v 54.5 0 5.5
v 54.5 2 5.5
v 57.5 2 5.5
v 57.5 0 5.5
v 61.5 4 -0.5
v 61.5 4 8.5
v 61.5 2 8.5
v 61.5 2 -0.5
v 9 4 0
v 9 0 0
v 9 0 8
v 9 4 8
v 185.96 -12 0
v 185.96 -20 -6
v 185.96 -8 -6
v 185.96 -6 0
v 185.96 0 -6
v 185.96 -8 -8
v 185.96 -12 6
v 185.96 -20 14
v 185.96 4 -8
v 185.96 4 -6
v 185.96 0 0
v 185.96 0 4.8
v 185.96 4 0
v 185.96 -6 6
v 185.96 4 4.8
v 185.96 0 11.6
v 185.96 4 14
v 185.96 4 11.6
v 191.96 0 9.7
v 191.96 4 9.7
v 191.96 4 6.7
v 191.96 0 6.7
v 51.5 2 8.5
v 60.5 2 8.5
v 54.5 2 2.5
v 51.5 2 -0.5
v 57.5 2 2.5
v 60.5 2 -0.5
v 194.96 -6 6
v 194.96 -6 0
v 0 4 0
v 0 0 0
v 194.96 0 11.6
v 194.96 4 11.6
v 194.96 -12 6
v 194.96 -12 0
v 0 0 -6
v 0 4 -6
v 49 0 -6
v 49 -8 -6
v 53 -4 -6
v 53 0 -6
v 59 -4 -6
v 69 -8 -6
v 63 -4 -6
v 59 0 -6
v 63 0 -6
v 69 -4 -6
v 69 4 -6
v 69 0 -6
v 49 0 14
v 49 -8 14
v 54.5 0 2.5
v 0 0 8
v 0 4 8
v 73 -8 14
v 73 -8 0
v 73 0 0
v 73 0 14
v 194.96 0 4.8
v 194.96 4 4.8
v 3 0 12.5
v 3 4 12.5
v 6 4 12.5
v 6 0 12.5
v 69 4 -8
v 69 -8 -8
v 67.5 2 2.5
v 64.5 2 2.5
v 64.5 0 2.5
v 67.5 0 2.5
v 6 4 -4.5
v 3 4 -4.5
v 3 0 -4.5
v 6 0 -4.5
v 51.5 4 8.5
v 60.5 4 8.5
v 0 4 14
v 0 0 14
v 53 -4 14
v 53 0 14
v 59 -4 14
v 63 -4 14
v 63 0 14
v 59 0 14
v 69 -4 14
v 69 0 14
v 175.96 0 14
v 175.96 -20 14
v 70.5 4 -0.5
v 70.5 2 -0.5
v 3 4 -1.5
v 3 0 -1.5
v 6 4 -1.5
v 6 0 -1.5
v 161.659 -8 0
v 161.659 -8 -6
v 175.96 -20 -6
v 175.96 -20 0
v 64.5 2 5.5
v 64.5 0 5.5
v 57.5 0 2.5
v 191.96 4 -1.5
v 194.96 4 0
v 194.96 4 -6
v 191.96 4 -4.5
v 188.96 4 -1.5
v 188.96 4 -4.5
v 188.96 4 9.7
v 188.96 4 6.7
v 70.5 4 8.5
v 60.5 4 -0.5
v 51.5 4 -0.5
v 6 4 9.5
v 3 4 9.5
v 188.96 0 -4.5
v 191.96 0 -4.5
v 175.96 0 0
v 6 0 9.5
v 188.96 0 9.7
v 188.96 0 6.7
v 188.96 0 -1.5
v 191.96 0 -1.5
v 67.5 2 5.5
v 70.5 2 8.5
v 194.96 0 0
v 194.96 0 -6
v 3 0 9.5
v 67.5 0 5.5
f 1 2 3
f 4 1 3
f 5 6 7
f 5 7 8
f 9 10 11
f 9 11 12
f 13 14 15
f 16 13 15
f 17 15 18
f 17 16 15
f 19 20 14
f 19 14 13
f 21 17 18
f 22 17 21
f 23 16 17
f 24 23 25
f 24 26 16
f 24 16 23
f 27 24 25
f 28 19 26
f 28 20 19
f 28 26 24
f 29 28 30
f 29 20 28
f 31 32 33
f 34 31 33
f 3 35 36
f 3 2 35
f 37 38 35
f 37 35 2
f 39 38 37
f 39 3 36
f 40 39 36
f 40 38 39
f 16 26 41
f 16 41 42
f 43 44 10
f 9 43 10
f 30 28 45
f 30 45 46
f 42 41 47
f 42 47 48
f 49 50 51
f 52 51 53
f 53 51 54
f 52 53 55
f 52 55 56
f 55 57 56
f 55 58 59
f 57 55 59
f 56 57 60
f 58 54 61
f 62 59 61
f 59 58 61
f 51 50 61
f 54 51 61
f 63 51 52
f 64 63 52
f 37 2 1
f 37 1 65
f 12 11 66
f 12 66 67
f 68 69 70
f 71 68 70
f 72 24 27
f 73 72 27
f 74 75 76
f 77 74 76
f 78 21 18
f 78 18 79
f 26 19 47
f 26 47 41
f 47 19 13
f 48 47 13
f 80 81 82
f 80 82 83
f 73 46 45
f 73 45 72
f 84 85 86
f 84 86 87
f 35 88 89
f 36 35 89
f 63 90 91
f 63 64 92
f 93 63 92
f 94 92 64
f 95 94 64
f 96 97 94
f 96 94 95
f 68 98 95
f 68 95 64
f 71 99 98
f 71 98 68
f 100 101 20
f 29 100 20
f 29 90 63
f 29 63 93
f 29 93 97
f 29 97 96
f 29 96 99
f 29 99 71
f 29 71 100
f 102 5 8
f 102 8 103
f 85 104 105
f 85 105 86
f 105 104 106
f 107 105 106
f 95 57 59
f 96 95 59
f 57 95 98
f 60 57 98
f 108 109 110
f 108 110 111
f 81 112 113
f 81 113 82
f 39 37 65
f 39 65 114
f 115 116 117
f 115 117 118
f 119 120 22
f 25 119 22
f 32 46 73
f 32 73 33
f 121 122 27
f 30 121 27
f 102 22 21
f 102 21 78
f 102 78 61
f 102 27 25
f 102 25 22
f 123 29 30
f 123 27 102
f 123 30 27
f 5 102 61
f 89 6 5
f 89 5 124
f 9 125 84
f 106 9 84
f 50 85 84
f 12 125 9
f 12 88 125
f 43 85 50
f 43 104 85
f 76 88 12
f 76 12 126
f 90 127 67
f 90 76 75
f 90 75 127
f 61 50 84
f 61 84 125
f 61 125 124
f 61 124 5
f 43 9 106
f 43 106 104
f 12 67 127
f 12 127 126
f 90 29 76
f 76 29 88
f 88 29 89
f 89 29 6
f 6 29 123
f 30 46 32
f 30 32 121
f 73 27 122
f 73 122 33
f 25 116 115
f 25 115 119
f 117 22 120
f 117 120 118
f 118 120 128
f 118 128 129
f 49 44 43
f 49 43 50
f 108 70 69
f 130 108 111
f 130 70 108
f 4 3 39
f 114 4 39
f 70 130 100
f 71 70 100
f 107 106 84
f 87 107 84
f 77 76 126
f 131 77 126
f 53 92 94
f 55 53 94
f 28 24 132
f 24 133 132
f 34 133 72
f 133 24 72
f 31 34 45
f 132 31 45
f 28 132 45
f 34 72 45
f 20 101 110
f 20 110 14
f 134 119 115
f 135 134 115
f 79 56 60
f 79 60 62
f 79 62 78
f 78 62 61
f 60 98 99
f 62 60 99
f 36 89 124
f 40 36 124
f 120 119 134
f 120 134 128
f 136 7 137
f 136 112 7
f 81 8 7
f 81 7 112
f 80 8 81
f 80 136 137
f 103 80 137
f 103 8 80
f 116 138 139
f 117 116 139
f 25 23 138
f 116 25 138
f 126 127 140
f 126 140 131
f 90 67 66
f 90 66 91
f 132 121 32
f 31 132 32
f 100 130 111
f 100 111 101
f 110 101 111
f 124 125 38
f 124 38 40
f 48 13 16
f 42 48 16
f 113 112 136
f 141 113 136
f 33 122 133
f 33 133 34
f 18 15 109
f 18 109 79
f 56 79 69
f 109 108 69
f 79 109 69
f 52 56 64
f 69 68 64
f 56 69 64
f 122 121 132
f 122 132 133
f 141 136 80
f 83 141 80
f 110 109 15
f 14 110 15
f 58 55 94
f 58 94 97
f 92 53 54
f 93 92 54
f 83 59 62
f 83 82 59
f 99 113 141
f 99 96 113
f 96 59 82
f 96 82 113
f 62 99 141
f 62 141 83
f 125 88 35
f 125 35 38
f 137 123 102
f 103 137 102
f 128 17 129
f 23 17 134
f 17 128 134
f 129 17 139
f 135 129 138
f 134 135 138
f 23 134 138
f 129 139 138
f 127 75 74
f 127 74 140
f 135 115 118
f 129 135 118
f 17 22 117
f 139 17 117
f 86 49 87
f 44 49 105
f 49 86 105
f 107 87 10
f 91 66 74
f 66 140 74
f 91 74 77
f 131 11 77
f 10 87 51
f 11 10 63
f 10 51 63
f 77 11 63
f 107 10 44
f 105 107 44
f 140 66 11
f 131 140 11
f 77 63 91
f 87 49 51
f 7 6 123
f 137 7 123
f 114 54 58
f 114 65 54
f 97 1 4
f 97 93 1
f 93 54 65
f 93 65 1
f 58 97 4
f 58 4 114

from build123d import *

# Parameters (mm, degrees)
SKETCH2_W           = 194.96
SKETCH2_H           = 6
BOSS_EXTRUDE1_DEPTH = 4
SKETCH3_W           = 176.96
SKETCH3_H           = 4
BOSS_EXTRUDE2_DEPTH = 14
SKETCH4_W           = 6
SKETCH4_H           = 4
BOSS_EXTRUDE3_DEPTH = 9
SKETCH5_W           = 6.8
SKETCH5_H           = 4
BOSS_EXTRUDE4_DEPTH = 9
CUT_EXTRUDE1_REACH  = 197.503
SKETCH6_W           = 3
SKETCH6_H           = 3
SKETCH7_W           = 10
SKETCH7_H           = 20
BOSS_EXTRUDE5_DEPTH = 20
SKETCH8_W           = 136.96
SKETCH8_H           = 6
BOSS_EXTRUDE6_DEPTH = 8
CHAMFER1_SIZE2      = 14.301043111
CHAMFER1_SIZE       = 12
BOSS_EXTRUDE7_DEPTH = 14
CUT_EXTRUDE2_REACH  = 199.001
SKETCH10_W          = 6
SKETCH10_H          = 4
CUT_EXTRUDE3_REACH  = 198.93
SKETCH11_W          = 3
SKETCH11_H          = 3
SKETCH12_W          = 116.96
SKETCH12_H          = 12
BOSS_EXTRUDE8_DEPTH = 2
SKETCH13_W          = 6
SKETCH13_H          = 6
BOSS_EXTRUDE9_DEPTH = 9
SKETCH14_W          = 9
SKETCH14_H          = 9
CUT_EXTRUDE4_DEPTH  = 2


with BuildPart() as part:
    # Sketch2 → Boss-Extrude1 (new body)
    with BuildSketch(Plane(origin=(0, 0, 0), x_dir=(1, 0, 0), z_dir=(0, 1, 0))):
        with Locations((97.48, 3)):
            Rectangle(SKETCH2_W, SKETCH2_H)
    extrude(amount=BOSS_EXTRUDE1_DEPTH)

    # Sketch3 → Boss-Extrude2 (add)
    with BuildSketch(Plane(origin=(0, 0, 0), x_dir=(-1, 0, 0), z_dir=(0, 0, -1))):
        with Locations((-97.48, 2)):
            Rectangle(SKETCH3_W, SKETCH3_H)
    extrude(amount=-BOSS_EXTRUDE2_DEPTH)

    # Sketch4 → Boss-Extrude3 (add)
    with BuildSketch(Plane.ZY.offset(-9)):
        with Locations((11, 2)):
            Rectangle(SKETCH4_W, SKETCH4_H)
    extrude(amount=BOSS_EXTRUDE3_DEPTH)

    # Sketch5 → Boss-Extrude4 (add)
    with BuildSketch(Plane(origin=(185.96, 0, 0), x_dir=(0, 0, -1), z_dir=(1, 0, 0))):
        with Locations((-8.2, 2)):
            Rectangle(SKETCH5_W, SKETCH5_H)
    extrude(amount=BOSS_EXTRUDE4_DEPTH)

    # Sketch6 → Cut-Extrude1 (cut, up to next)
    with BuildSketch(Plane(origin=(0, 4, 0), x_dir=(1, 0, 0), z_dir=(0, 1, 0)), mode=Mode.PRIVATE) as cut_extrude1_sk1:
        with Locations((4.5, 3)):
            Rectangle(SKETCH6_W, SKETCH6_H)
    cut_extrude1_tool1 = extrude(cut_extrude1_sk1.sketch, amount=-CUT_EXTRUDE1_REACH, mode=Mode.PRIVATE) & part.part
    # Sketch6 → Cut-Extrude1 (cut, up to next)
    with BuildSketch(Plane(origin=(0, 4, 0), x_dir=(1, 0, 0), z_dir=(0, 1, 0)), mode=Mode.PRIVATE) as cut_extrude1_sk2:
        with Locations((4.5, -11)):
            Rectangle(SKETCH6_W, SKETCH6_H)
    cut_extrude1_tool2 = extrude(cut_extrude1_sk2.sketch, amount=-CUT_EXTRUDE1_REACH, mode=Mode.PRIVATE) & part.part
    # Sketch6 → Cut-Extrude1 (cut, up to next)
    with BuildSketch(Plane(origin=(0, 4, 0), x_dir=(1, 0, 0), z_dir=(0, 1, 0)), mode=Mode.PRIVATE) as cut_extrude1_sk3:
        with Locations((190.46, 3)):
            Rectangle(SKETCH6_W, SKETCH6_H)
    cut_extrude1_tool3 = extrude(cut_extrude1_sk3.sketch, amount=-CUT_EXTRUDE1_REACH, mode=Mode.PRIVATE) & part.part
    # Sketch6 → Cut-Extrude1 (cut, up to next)
    with BuildSketch(Plane(origin=(0, 4, 0), x_dir=(1, 0, 0), z_dir=(0, 1, 0)), mode=Mode.PRIVATE) as cut_extrude1_sk4:
        with Locations((190.46, -8.2)):
            Rectangle(SKETCH6_W, SKETCH6_H)
    cut_extrude1_tool4 = extrude(cut_extrude1_sk4.sketch, amount=-CUT_EXTRUDE1_REACH, mode=Mode.PRIVATE) & part.part
    add(cut_extrude1_tool1.solids().sort_by_distance((4.5, 4, -3))[0], mode=Mode.SUBTRACT)
    add(cut_extrude1_tool2.solids().sort_by_distance((4.5, 4, 11))[0], mode=Mode.SUBTRACT)
    add(cut_extrude1_tool3.solids().sort_by_distance((190.46, 4, -3))[0], mode=Mode.SUBTRACT)
    add(cut_extrude1_tool4.solids().sort_by_distance((190.46, 4, 8.2))[0], mode=Mode.SUBTRACT)

    # Sketch7 → Boss-Extrude5 (add)
    with BuildSketch(Plane.XZ):
        with Locations((180.96, 4)):
            Rectangle(SKETCH7_W, SKETCH7_H)
    extrude(amount=BOSS_EXTRUDE5_DEPTH)

    # Sketch8 → Boss-Extrude6 (add)
    with BuildSketch(Plane.XZ):
        with Locations((117.48, -3)):
            Rectangle(SKETCH8_W, SKETCH8_H)
    extrude(amount=BOSS_EXTRUDE6_DEPTH)

    # Chamfer1
    chamfer1_edges = [part.edges().sort_by_distance(p)[0] for p in [
        (175.96, -8, -3),
    ]]
    chamfer1_side = [part.faces().sort_by_distance(p)[0] for p in [
        (175.96, -8.24, -3),
    ]]
    chamfer(chamfer1_edges, length=CHAMFER1_SIZE - 0.0001, length2=CHAMFER1_SIZE2 - 0.0001, reference=chamfer1_side[0])  # a hair under: the kernel refuses the full size

    # Sketch9 → Boss-Extrude7 (add)
    with BuildSketch(Plane.XY):
        Polygon((49, -8), (55, -8), (61, -8), (73, -8), (73, 0), (61, 0), (55, 0), (49, 0), align=None)
    extrude(amount=BOSS_EXTRUDE7_DEPTH)

    # Sketch10 → Cut-Extrude2 (cut, up to next)
    with BuildSketch(Plane.XY.offset(14), mode=Mode.PRIVATE) as cut_extrude2_sk1:
        with Locations((56, -2)):
            Rectangle(SKETCH10_W, SKETCH10_H)
    cut_extrude2_tool1 = extrude(cut_extrude2_sk1.sketch, amount=-CUT_EXTRUDE2_REACH, mode=Mode.PRIVATE) & part.part
    # Sketch10 → Cut-Extrude2 (cut, up to next)
    with BuildSketch(Plane.XY.offset(14), mode=Mode.PRIVATE) as cut_extrude2_sk2:
        with Locations((66, -2)):
            Rectangle(SKETCH10_W, SKETCH10_H)
    cut_extrude2_tool2 = extrude(cut_extrude2_sk2.sketch, amount=-CUT_EXTRUDE2_REACH, mode=Mode.PRIVATE) & part.part
    add(cut_extrude2_tool1.solids().sort_by_distance((56, -2, 14))[0], mode=Mode.SUBTRACT)
    add(cut_extrude2_tool2.solids().sort_by_distance((66, -2, 14))[0], mode=Mode.SUBTRACT)

    # Sketch11 → Cut-Extrude3 (cut, up to next)
    with BuildSketch(Plane(origin=(0, 4, 0), x_dir=(1, 0, 0), z_dir=(0, 1, 0)), mode=Mode.PRIVATE) as cut_extrude3_sk1:
        with Locations((56, -4)):
            Rectangle(SKETCH11_W, SKETCH11_H)
    cut_extrude3_tool1 = extrude(cut_extrude3_sk1.sketch, amount=-CUT_EXTRUDE3_REACH, mode=Mode.PRIVATE) & part.part
    # Sketch11 → Cut-Extrude3 (cut, up to next)
    with BuildSketch(Plane(origin=(0, 4, 0), x_dir=(1, 0, 0), z_dir=(0, 1, 0)), mode=Mode.PRIVATE) as cut_extrude3_sk2:
        with Locations((66, -4)):
            Rectangle(SKETCH11_W, SKETCH11_H)
    cut_extrude3_tool2 = extrude(cut_extrude3_sk2.sketch, amount=-CUT_EXTRUDE3_REACH, mode=Mode.PRIVATE) & part.part
    add(cut_extrude3_tool1.solids().sort_by_distance((56, 4, 4))[0], mode=Mode.SUBTRACT)
    add(cut_extrude3_tool2.solids().sort_by_distance((66, 4, 4))[0], mode=Mode.SUBTRACT)

    # Sketch12 → Boss-Extrude8 (add)
    with BuildSketch(Plane(origin=(0, 0, -6), x_dir=(-1, 0, 0), z_dir=(0, 0, -1))):
        with Locations((-127.48, -2)):
            Rectangle(SKETCH12_W, SKETCH12_H)
    extrude(amount=BOSS_EXTRUDE8_DEPTH)

    # Sketch13 → Boss-Extrude9 (add)
    with BuildSketch(Plane(origin=(185.96, 0, 0), x_dir=(0, 0, -1), z_dir=(1, 0, 0))):
        with Locations((-3, -9)):
            Rectangle(SKETCH13_W, SKETCH13_H)
    extrude(amount=BOSS_EXTRUDE9_DEPTH)

    # Sketch14 → Cut-Extrude4 (cut)
    with BuildSketch(Plane(origin=(0, 4, 0), x_dir=(1, 0, 0), z_dir=(0, 1, 0))):
        with Locations((66, -4)):
            Rectangle(SKETCH14_W, SKETCH14_H)
        with Locations((56, -4)):
            Rectangle(SKETCH14_W, SKETCH14_H)
    extrude(amount=-CUT_EXTRUDE4_DEPTH, mode=Mode.SUBTRACT)


solid = part.part
